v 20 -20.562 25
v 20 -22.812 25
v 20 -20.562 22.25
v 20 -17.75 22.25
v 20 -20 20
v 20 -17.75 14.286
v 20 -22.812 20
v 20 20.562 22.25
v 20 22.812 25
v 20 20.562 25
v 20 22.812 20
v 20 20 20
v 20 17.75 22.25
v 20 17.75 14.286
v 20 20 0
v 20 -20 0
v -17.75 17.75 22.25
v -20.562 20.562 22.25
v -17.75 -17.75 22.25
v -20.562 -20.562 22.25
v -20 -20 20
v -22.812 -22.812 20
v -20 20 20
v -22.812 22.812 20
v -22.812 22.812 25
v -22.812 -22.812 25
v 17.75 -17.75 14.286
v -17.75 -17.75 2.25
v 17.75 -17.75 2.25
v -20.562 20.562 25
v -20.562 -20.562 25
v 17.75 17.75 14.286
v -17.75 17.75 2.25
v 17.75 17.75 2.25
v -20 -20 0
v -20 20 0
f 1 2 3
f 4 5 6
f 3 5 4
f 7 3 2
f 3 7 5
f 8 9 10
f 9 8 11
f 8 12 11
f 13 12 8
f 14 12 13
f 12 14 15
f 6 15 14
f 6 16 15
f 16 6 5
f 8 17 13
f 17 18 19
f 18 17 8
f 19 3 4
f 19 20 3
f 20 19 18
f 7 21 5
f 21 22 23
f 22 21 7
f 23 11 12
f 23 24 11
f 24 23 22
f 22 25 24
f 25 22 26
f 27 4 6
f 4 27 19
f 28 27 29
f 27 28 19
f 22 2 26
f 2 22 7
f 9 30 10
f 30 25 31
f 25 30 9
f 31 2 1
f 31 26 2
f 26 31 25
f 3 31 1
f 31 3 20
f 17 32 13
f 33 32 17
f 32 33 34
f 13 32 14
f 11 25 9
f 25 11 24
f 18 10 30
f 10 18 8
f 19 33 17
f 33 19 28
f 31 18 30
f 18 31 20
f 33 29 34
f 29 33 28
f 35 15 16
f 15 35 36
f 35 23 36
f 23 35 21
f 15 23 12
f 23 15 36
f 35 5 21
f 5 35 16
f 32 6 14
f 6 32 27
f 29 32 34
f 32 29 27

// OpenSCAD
// written by Intog
// intogria@gmail.com


////// CUSTOMIZATIONS /////

// (internal) Container Width
cWidth = 40;  

// (internal) Container Height
cHeight = 20; 

// (internal Container Depth
cDepth = 40; 

// Wall Thickness
wThick = 2.25;

// Front Opening Size
frontGap = 1.4;

// Amout of Wiggle Room ( set to 2 for a tight fit)
lipOffset = 2.25;

railHeight = .25;

// Model Size Info ///////////////////////////////

echo("(Z) height:", cHeight*.2+cHeight); 
echo("(Y) Width", cWidth+lipAdj*2-wThick*2);
echo("(X) Depth", cDepth+lipAdj-wThick);

// maths ////////////////////////////////////////

lipAdj = lipOffset*wThick;

railHeightCalc = cHeight*railHeight;

// renders ////////////////////////////////////////

stackBox();

// uncomment below to view stacked...
//translate([0,0,cHeight+wThick]) stackBox();

// modules ////////////////////////////////////////

module container(){
    
 // floor
    translate ([0,0,wThick/2])
   cube  ([cDepth,cWidth,wThick], center = true); 
   
// left wall
    translate([ -cDepth/2,-cWidth/2, 0 ])
       cube  ([ cDepth, wThick, cHeight ]); 
    
// right wall
    translate([ -cDepth/2, cWidth/2-wThick, 0 ])
       cube  ([ cDepth, wThick, cHeight ]); 
    
// back wall
    translate([-cDepth/2, -cWidth/2, 0 ])
       cube  ([ wThick,cWidth, cHeight ]); 
    
// lip
    translate([cDepth/2-wThick, -cWidth/2, 0 ])
       cube  ([ wThick, cWidth, cHeight/frontGap]); 
}

module railConstruct(){
    
    
//left rail
    translate([-cDepth/2-lipAdj+wThick, -cWidth/2-lipAdj+wThick, cHeight])
    railSide();
    
//right rail
     rotate([0,0,180])
    translate([-cDepth/2,-cWidth/2-lipAdj+wThick,cHeight])
    railSide();
    
//backrail
    
    translate([ -cDepth/2-lipAdj+wThick, -cWidth/2-lipAdj+wThick, cHeight])
    railBack();
    
}


module railSide(){
    
//floor
    cube  ([ cDepth+lipAdj-wThick, lipAdj, wThick ]); 
    
//side
  cube  ([ cDepth+lipAdj-wThick,wThick, railHeightCalc ]); 
    
}

module railBack(){
    
//floor
    cube  ([ lipAdj, cWidth+lipAdj, wThick]); 
    
//side
    cube  ([ wThick, cWidth+lipAdj*2-wThick*2, railHeightCalc]); 
    
}


module stackBox(){
    
railConstruct();

container();
    
}
